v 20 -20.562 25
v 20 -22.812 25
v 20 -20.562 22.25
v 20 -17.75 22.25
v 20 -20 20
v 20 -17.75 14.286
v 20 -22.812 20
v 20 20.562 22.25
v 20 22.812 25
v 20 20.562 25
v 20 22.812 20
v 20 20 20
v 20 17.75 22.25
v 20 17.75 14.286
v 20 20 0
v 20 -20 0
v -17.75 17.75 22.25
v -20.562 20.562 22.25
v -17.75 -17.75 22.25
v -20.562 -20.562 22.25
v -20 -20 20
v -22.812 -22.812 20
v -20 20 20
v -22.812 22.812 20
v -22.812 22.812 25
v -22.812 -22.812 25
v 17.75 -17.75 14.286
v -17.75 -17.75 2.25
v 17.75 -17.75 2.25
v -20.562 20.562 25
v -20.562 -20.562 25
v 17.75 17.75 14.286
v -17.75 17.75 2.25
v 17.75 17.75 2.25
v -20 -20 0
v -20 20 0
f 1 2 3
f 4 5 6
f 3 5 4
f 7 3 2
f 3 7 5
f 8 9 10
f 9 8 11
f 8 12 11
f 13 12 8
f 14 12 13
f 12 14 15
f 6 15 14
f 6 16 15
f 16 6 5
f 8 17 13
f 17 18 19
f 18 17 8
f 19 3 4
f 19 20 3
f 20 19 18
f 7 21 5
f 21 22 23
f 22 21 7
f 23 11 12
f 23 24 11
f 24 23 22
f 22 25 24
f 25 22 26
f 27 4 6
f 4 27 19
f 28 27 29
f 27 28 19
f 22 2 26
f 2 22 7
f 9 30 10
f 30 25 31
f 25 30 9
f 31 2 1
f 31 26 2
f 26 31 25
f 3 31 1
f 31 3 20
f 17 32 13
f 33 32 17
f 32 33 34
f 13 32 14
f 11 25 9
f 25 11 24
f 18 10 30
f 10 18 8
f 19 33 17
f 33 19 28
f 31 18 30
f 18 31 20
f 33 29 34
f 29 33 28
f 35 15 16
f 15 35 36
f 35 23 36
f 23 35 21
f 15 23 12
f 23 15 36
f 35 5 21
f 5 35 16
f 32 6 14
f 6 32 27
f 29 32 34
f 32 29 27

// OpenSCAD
// written by Intog
// intogria@gmail.com


////// CUSTOMIZATIONS /////

// (internal) Container Width
cWidth = 40;  

// (internal) Container Height
cHeight = 20; 

// (internal Container Depth
cDepth = 40; 

// Wall Thickness
wThick = 2.25;

// Front Opening Size
frontGap = 1.4;

// Amout of Wiggle Room ( set to 2 for a tight fit)
lipOffset = 2.25;

railHeight = .25;

// Model Size Info ///////////////////////////////

echo("(Z) height:", cHeight*.2+cHeight); 
echo("(Y) Width", cWidth+lipAdj*2-wThick*2);
echo("(X) Depth", cDepth+lipAdj-wThick);

// maths ////////////////////////////////////////

lipAdj = lipOffset*wThick;

railHeightCalc = cHeight*railHeight;

// renders ////////////////////////////////////////

stackBox();

// uncomment below to view stacked...
//translate([0,0,cHeight+wThick]) stackBox();

// modules ////////////////////////////////////////

module container(){
    
 // floor
    translate ([0,0,wThick/2])
   cube  ([cDepth,cWidth,wThick], center = true); 
   
// left wall
    translate([ -cDepth/2,-cWidth/2, 0 ])
       cube  ([ cDepth, wThick, cHeight ]); 
    
// right wall
    translate([ -cDepth/2, cWidth/2-wThick, 0 ])
       cube  ([ cDepth, wThick, cHeight ]); 
    
// back wall
    translate([-cDepth/2, -cWidth/2, 0 ])
       cube  ([ wThick,cWidth, cHeight ]); 
    
// lip
    translate([cDepth/2-wThick, -cWidth/2, 0 ])
       cube  ([ wThick, cWidth, cHeight/frontGap]); 
}

module railConstruct(){
    
    
//left rail
    translate([-cDepth/2-lipAdj+wThick, -cWidth/2-lipAdj+wThick, cHeight])
    railSide();
    
//right rail
     rotate([0,0,180])
    translate([-cDepth/2,-cWidth/2-lipAdj+wThick,cHeight])
    railSide();
    
//backrail
    
    translate([ -cDepth/2-lipAdj+wThick, -cWidth/2-lipAdj+wThick, cHeight])
    railBack();
    
}


module railSide(){
    
//floor
    cube  ([ cDepth+lipAdj-wThick, lipAdj, wThick ]); 
    
//side
  cube  ([ cDepth+lipAdj-wThick,wThick, railHeightCalc ]); 
    
}

module railBack(){
    
//floor
    cube  ([ lipAdj, cWidth+lipAdj, wThick]); 
    
//side
    cube  ([ wThick, cWidth+lipAdj*2-wThick*2, railHeightCalc]); 
    
}


module stackBox(){
    
railConstruct();

container();
    
}
